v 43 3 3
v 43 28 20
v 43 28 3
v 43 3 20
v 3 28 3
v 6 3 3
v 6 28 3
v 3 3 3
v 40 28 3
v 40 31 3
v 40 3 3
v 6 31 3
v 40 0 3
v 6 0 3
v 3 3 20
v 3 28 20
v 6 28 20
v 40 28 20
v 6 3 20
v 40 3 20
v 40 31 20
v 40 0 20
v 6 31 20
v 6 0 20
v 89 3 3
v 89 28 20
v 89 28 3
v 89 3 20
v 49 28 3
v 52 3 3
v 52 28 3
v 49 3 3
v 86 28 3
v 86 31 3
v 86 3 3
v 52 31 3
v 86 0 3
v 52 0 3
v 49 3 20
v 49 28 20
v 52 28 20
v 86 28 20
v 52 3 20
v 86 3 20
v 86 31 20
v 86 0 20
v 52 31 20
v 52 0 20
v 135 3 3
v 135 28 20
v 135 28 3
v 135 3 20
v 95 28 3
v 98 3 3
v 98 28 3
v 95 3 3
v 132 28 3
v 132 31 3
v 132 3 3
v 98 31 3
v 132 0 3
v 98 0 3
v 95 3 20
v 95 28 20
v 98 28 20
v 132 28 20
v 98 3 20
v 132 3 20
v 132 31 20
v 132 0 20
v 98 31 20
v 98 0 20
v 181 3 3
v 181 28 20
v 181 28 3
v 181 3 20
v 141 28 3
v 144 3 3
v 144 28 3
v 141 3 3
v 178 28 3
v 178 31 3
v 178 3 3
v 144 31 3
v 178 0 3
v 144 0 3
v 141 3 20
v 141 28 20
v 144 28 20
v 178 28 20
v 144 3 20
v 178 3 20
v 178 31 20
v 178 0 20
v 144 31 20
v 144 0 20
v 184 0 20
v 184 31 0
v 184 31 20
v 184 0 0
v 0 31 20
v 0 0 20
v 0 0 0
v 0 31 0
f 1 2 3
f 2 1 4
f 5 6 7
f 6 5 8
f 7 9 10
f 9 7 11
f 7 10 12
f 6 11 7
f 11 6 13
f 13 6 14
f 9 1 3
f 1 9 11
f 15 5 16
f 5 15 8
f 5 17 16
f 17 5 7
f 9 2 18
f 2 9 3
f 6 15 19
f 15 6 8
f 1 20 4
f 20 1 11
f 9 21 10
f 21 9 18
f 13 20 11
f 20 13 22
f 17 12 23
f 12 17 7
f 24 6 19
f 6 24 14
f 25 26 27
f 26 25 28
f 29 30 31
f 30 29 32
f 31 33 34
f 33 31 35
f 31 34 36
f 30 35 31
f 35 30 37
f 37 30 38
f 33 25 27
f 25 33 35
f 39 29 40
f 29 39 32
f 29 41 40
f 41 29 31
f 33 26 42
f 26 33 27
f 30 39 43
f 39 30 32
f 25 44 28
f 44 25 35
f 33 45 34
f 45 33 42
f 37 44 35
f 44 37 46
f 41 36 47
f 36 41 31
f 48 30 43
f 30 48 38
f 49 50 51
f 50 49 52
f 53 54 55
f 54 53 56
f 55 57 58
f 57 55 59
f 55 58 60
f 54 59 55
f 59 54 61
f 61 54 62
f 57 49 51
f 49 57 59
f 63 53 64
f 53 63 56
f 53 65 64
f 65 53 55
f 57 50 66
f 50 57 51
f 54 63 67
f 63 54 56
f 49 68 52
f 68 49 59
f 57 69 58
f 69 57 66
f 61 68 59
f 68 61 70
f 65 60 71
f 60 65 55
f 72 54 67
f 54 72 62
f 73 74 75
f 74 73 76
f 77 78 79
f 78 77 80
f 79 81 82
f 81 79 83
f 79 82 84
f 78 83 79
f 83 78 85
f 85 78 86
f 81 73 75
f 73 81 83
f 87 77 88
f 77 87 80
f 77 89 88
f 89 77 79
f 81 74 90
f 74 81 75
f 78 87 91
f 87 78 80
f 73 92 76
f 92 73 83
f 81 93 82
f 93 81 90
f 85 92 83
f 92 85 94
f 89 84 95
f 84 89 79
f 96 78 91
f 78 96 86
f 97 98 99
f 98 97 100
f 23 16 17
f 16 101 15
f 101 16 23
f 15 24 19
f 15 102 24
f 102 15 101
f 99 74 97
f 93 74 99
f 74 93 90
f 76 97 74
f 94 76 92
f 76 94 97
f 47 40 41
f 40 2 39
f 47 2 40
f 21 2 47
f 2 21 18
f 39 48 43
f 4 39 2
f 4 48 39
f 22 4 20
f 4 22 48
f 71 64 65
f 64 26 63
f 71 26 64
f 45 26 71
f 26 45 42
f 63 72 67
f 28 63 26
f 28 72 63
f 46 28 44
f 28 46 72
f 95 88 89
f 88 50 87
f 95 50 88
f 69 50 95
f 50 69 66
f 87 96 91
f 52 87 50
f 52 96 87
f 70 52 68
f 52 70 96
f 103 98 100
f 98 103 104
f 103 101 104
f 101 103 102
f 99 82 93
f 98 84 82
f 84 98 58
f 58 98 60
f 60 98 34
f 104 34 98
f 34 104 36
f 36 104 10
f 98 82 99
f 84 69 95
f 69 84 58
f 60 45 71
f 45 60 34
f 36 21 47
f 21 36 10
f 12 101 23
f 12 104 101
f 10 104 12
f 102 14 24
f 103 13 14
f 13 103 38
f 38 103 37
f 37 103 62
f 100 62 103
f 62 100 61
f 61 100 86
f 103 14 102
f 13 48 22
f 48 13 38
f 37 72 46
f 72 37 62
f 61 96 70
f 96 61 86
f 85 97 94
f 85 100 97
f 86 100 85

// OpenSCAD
// Camera dimensions
camera_height = 30;
camera_width = 40;
camera_depth = 25;

wall_grab_width = 3;
wall_grab_height = 20;


difference() {
    cube(size = [4 * camera_width + 2 * wall_grab_width + 3 * 2 * wall_grab_width, camera_depth + 2 * wall_grab_width, wall_grab_height], center = false);
    
    // 4 cameras
    translate([3, 3, 3]) union() {
        for (i = [0:3]) {
            translate([i * camera_width + 2* wall_grab_width * i, 0, 0]) cube(size = [      camera_width, camera_depth, camera_height], center = false);
            translate([i * camera_width + 2*wall_grab_width * i + wall_grab_width, -1-wall_grab_width, 0]) cube(size = [camera_width - 2*wall_grab_width, camera_depth + 2*wall_grab_width + 2, camera_height], center = false);
        }
    }
}
